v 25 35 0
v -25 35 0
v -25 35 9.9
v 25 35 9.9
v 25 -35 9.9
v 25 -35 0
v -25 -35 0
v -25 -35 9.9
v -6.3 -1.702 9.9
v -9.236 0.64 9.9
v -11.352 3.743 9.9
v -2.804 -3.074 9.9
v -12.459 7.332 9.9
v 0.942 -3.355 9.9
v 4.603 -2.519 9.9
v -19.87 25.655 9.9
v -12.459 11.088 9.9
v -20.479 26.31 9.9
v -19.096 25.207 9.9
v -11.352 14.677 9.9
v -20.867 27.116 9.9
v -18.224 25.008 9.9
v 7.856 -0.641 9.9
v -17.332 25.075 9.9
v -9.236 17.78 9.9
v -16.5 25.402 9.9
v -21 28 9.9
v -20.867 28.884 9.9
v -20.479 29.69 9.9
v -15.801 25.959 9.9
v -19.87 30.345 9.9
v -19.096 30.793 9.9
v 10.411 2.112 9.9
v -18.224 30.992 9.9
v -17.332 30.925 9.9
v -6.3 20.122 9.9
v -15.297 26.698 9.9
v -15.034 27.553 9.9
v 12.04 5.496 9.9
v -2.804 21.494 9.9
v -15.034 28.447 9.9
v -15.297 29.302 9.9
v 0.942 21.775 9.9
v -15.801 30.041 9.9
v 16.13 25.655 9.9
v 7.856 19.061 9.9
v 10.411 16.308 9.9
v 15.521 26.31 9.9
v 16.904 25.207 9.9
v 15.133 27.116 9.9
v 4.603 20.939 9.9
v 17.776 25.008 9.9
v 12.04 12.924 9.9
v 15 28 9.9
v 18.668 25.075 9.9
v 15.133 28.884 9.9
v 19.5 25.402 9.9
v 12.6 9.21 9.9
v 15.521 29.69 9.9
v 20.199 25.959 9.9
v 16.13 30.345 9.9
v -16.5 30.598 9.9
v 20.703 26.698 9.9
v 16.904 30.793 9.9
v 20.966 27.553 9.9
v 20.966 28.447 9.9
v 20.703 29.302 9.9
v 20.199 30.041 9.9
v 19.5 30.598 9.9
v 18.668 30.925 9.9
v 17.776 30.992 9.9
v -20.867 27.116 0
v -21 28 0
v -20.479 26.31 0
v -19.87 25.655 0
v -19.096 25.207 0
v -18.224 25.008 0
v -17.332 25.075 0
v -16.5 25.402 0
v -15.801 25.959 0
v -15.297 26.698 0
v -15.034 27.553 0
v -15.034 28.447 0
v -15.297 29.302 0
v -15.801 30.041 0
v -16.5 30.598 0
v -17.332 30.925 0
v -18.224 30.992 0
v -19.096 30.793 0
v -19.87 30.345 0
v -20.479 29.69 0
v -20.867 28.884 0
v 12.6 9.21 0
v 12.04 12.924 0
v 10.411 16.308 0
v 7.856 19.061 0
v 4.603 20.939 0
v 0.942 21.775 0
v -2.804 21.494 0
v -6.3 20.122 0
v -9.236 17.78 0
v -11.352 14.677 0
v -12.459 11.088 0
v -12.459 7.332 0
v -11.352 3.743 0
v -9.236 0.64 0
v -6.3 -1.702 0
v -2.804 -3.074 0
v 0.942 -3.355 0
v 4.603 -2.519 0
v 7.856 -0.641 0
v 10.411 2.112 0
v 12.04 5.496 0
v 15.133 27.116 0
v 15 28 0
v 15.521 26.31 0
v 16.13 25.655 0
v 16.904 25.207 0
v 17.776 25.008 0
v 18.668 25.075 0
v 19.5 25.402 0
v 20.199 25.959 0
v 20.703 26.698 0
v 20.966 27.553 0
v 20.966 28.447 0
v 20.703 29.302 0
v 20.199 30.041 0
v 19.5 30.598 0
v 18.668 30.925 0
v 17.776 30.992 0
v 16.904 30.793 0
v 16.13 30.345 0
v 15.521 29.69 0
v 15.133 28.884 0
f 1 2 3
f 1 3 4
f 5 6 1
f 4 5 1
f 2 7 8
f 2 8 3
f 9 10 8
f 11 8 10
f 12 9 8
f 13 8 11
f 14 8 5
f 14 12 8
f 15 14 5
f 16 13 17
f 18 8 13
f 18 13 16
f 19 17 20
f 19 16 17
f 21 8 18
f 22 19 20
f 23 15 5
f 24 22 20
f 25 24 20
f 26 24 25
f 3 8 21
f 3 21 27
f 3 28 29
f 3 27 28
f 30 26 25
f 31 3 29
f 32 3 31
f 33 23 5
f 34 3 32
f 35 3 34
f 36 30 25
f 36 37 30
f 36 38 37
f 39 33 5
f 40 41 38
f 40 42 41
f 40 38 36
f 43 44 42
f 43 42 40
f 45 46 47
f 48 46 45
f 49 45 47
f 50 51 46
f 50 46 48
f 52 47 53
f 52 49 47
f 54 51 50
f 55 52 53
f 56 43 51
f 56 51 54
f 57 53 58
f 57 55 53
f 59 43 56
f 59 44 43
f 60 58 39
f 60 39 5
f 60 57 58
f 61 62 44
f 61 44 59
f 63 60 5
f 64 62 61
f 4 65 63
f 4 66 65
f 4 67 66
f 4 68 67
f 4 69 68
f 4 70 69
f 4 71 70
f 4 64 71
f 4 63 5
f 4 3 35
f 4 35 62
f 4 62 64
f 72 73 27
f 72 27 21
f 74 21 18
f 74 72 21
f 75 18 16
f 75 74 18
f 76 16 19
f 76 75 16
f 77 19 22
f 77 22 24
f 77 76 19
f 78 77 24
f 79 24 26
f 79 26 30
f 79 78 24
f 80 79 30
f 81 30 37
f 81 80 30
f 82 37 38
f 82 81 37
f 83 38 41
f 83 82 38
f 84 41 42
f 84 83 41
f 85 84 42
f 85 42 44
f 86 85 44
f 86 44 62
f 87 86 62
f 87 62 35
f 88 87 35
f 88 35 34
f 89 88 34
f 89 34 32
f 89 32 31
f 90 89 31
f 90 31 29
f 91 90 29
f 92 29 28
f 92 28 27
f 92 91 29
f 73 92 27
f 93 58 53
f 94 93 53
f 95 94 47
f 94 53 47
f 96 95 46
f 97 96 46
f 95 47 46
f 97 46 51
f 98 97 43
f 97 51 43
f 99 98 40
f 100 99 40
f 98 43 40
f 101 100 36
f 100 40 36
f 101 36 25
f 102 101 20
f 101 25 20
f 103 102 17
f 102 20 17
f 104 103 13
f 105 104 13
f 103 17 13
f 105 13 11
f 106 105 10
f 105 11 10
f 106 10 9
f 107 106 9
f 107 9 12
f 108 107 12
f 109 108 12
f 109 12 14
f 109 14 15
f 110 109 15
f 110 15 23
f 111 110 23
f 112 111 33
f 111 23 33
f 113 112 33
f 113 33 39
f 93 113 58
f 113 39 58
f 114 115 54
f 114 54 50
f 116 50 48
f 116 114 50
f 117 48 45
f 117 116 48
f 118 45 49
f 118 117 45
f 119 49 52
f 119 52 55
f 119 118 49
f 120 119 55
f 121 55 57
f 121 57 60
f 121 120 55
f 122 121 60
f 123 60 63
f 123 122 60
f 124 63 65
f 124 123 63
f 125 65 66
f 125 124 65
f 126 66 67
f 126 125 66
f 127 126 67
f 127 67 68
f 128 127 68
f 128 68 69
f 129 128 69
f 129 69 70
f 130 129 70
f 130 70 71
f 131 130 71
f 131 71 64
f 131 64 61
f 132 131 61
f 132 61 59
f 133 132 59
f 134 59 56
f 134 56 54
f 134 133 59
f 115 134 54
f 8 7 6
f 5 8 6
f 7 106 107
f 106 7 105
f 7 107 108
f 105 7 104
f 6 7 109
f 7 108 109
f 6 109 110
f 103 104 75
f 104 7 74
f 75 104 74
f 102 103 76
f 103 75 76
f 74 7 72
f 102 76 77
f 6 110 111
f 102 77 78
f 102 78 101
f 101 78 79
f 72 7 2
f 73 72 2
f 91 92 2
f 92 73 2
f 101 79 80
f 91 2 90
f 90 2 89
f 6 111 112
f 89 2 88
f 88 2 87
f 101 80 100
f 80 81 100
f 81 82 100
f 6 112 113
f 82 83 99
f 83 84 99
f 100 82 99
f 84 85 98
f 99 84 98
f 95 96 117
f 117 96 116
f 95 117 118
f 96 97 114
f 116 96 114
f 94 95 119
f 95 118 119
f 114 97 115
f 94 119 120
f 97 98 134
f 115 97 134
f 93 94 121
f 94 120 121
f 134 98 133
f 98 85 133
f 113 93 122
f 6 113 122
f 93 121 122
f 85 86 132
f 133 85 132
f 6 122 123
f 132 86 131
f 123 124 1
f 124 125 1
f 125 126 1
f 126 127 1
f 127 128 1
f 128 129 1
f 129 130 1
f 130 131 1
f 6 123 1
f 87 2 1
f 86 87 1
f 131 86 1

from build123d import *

# Parameters (mm, degrees)
CROQUIS1_W              = 50
CROQUIS1_H              = 70
CROQUIS1_R              = 3
SALIENTE_EXTRUIR1_DEPTH = 9.9
CROQUIS2_R              = 12.6
CORTAR_EXTRUIR1_DEPTH   = 9.9


with BuildPart() as part:
    # Croquis1 → Saliente-Extruir1 (new body)
    with BuildSketch(Plane.XY):
        Rectangle(CROQUIS1_W, CROQUIS1_H)
        with Locations(Location((-18, 28, 0), (0, 0, 180))):
            Circle(CROQUIS1_R, mode=Mode.SUBTRACT)
        with Locations(Location((18, 28, 0), (0, 0, 180))):
            Circle(CROQUIS1_R, mode=Mode.SUBTRACT)
    extrude(amount=SALIENTE_EXTRUIR1_DEPTH)

    # Croquis2 → Cortar-Extruir1 (cut)
    with BuildSketch(Plane.XY.offset(9.9)):
        with Locations((0, 9.20979846)):
            Circle(CROQUIS2_R)
    extrude(amount=-CORTAR_EXTRUIR1_DEPTH, mode=Mode.SUBTRACT)


solid = part.part
